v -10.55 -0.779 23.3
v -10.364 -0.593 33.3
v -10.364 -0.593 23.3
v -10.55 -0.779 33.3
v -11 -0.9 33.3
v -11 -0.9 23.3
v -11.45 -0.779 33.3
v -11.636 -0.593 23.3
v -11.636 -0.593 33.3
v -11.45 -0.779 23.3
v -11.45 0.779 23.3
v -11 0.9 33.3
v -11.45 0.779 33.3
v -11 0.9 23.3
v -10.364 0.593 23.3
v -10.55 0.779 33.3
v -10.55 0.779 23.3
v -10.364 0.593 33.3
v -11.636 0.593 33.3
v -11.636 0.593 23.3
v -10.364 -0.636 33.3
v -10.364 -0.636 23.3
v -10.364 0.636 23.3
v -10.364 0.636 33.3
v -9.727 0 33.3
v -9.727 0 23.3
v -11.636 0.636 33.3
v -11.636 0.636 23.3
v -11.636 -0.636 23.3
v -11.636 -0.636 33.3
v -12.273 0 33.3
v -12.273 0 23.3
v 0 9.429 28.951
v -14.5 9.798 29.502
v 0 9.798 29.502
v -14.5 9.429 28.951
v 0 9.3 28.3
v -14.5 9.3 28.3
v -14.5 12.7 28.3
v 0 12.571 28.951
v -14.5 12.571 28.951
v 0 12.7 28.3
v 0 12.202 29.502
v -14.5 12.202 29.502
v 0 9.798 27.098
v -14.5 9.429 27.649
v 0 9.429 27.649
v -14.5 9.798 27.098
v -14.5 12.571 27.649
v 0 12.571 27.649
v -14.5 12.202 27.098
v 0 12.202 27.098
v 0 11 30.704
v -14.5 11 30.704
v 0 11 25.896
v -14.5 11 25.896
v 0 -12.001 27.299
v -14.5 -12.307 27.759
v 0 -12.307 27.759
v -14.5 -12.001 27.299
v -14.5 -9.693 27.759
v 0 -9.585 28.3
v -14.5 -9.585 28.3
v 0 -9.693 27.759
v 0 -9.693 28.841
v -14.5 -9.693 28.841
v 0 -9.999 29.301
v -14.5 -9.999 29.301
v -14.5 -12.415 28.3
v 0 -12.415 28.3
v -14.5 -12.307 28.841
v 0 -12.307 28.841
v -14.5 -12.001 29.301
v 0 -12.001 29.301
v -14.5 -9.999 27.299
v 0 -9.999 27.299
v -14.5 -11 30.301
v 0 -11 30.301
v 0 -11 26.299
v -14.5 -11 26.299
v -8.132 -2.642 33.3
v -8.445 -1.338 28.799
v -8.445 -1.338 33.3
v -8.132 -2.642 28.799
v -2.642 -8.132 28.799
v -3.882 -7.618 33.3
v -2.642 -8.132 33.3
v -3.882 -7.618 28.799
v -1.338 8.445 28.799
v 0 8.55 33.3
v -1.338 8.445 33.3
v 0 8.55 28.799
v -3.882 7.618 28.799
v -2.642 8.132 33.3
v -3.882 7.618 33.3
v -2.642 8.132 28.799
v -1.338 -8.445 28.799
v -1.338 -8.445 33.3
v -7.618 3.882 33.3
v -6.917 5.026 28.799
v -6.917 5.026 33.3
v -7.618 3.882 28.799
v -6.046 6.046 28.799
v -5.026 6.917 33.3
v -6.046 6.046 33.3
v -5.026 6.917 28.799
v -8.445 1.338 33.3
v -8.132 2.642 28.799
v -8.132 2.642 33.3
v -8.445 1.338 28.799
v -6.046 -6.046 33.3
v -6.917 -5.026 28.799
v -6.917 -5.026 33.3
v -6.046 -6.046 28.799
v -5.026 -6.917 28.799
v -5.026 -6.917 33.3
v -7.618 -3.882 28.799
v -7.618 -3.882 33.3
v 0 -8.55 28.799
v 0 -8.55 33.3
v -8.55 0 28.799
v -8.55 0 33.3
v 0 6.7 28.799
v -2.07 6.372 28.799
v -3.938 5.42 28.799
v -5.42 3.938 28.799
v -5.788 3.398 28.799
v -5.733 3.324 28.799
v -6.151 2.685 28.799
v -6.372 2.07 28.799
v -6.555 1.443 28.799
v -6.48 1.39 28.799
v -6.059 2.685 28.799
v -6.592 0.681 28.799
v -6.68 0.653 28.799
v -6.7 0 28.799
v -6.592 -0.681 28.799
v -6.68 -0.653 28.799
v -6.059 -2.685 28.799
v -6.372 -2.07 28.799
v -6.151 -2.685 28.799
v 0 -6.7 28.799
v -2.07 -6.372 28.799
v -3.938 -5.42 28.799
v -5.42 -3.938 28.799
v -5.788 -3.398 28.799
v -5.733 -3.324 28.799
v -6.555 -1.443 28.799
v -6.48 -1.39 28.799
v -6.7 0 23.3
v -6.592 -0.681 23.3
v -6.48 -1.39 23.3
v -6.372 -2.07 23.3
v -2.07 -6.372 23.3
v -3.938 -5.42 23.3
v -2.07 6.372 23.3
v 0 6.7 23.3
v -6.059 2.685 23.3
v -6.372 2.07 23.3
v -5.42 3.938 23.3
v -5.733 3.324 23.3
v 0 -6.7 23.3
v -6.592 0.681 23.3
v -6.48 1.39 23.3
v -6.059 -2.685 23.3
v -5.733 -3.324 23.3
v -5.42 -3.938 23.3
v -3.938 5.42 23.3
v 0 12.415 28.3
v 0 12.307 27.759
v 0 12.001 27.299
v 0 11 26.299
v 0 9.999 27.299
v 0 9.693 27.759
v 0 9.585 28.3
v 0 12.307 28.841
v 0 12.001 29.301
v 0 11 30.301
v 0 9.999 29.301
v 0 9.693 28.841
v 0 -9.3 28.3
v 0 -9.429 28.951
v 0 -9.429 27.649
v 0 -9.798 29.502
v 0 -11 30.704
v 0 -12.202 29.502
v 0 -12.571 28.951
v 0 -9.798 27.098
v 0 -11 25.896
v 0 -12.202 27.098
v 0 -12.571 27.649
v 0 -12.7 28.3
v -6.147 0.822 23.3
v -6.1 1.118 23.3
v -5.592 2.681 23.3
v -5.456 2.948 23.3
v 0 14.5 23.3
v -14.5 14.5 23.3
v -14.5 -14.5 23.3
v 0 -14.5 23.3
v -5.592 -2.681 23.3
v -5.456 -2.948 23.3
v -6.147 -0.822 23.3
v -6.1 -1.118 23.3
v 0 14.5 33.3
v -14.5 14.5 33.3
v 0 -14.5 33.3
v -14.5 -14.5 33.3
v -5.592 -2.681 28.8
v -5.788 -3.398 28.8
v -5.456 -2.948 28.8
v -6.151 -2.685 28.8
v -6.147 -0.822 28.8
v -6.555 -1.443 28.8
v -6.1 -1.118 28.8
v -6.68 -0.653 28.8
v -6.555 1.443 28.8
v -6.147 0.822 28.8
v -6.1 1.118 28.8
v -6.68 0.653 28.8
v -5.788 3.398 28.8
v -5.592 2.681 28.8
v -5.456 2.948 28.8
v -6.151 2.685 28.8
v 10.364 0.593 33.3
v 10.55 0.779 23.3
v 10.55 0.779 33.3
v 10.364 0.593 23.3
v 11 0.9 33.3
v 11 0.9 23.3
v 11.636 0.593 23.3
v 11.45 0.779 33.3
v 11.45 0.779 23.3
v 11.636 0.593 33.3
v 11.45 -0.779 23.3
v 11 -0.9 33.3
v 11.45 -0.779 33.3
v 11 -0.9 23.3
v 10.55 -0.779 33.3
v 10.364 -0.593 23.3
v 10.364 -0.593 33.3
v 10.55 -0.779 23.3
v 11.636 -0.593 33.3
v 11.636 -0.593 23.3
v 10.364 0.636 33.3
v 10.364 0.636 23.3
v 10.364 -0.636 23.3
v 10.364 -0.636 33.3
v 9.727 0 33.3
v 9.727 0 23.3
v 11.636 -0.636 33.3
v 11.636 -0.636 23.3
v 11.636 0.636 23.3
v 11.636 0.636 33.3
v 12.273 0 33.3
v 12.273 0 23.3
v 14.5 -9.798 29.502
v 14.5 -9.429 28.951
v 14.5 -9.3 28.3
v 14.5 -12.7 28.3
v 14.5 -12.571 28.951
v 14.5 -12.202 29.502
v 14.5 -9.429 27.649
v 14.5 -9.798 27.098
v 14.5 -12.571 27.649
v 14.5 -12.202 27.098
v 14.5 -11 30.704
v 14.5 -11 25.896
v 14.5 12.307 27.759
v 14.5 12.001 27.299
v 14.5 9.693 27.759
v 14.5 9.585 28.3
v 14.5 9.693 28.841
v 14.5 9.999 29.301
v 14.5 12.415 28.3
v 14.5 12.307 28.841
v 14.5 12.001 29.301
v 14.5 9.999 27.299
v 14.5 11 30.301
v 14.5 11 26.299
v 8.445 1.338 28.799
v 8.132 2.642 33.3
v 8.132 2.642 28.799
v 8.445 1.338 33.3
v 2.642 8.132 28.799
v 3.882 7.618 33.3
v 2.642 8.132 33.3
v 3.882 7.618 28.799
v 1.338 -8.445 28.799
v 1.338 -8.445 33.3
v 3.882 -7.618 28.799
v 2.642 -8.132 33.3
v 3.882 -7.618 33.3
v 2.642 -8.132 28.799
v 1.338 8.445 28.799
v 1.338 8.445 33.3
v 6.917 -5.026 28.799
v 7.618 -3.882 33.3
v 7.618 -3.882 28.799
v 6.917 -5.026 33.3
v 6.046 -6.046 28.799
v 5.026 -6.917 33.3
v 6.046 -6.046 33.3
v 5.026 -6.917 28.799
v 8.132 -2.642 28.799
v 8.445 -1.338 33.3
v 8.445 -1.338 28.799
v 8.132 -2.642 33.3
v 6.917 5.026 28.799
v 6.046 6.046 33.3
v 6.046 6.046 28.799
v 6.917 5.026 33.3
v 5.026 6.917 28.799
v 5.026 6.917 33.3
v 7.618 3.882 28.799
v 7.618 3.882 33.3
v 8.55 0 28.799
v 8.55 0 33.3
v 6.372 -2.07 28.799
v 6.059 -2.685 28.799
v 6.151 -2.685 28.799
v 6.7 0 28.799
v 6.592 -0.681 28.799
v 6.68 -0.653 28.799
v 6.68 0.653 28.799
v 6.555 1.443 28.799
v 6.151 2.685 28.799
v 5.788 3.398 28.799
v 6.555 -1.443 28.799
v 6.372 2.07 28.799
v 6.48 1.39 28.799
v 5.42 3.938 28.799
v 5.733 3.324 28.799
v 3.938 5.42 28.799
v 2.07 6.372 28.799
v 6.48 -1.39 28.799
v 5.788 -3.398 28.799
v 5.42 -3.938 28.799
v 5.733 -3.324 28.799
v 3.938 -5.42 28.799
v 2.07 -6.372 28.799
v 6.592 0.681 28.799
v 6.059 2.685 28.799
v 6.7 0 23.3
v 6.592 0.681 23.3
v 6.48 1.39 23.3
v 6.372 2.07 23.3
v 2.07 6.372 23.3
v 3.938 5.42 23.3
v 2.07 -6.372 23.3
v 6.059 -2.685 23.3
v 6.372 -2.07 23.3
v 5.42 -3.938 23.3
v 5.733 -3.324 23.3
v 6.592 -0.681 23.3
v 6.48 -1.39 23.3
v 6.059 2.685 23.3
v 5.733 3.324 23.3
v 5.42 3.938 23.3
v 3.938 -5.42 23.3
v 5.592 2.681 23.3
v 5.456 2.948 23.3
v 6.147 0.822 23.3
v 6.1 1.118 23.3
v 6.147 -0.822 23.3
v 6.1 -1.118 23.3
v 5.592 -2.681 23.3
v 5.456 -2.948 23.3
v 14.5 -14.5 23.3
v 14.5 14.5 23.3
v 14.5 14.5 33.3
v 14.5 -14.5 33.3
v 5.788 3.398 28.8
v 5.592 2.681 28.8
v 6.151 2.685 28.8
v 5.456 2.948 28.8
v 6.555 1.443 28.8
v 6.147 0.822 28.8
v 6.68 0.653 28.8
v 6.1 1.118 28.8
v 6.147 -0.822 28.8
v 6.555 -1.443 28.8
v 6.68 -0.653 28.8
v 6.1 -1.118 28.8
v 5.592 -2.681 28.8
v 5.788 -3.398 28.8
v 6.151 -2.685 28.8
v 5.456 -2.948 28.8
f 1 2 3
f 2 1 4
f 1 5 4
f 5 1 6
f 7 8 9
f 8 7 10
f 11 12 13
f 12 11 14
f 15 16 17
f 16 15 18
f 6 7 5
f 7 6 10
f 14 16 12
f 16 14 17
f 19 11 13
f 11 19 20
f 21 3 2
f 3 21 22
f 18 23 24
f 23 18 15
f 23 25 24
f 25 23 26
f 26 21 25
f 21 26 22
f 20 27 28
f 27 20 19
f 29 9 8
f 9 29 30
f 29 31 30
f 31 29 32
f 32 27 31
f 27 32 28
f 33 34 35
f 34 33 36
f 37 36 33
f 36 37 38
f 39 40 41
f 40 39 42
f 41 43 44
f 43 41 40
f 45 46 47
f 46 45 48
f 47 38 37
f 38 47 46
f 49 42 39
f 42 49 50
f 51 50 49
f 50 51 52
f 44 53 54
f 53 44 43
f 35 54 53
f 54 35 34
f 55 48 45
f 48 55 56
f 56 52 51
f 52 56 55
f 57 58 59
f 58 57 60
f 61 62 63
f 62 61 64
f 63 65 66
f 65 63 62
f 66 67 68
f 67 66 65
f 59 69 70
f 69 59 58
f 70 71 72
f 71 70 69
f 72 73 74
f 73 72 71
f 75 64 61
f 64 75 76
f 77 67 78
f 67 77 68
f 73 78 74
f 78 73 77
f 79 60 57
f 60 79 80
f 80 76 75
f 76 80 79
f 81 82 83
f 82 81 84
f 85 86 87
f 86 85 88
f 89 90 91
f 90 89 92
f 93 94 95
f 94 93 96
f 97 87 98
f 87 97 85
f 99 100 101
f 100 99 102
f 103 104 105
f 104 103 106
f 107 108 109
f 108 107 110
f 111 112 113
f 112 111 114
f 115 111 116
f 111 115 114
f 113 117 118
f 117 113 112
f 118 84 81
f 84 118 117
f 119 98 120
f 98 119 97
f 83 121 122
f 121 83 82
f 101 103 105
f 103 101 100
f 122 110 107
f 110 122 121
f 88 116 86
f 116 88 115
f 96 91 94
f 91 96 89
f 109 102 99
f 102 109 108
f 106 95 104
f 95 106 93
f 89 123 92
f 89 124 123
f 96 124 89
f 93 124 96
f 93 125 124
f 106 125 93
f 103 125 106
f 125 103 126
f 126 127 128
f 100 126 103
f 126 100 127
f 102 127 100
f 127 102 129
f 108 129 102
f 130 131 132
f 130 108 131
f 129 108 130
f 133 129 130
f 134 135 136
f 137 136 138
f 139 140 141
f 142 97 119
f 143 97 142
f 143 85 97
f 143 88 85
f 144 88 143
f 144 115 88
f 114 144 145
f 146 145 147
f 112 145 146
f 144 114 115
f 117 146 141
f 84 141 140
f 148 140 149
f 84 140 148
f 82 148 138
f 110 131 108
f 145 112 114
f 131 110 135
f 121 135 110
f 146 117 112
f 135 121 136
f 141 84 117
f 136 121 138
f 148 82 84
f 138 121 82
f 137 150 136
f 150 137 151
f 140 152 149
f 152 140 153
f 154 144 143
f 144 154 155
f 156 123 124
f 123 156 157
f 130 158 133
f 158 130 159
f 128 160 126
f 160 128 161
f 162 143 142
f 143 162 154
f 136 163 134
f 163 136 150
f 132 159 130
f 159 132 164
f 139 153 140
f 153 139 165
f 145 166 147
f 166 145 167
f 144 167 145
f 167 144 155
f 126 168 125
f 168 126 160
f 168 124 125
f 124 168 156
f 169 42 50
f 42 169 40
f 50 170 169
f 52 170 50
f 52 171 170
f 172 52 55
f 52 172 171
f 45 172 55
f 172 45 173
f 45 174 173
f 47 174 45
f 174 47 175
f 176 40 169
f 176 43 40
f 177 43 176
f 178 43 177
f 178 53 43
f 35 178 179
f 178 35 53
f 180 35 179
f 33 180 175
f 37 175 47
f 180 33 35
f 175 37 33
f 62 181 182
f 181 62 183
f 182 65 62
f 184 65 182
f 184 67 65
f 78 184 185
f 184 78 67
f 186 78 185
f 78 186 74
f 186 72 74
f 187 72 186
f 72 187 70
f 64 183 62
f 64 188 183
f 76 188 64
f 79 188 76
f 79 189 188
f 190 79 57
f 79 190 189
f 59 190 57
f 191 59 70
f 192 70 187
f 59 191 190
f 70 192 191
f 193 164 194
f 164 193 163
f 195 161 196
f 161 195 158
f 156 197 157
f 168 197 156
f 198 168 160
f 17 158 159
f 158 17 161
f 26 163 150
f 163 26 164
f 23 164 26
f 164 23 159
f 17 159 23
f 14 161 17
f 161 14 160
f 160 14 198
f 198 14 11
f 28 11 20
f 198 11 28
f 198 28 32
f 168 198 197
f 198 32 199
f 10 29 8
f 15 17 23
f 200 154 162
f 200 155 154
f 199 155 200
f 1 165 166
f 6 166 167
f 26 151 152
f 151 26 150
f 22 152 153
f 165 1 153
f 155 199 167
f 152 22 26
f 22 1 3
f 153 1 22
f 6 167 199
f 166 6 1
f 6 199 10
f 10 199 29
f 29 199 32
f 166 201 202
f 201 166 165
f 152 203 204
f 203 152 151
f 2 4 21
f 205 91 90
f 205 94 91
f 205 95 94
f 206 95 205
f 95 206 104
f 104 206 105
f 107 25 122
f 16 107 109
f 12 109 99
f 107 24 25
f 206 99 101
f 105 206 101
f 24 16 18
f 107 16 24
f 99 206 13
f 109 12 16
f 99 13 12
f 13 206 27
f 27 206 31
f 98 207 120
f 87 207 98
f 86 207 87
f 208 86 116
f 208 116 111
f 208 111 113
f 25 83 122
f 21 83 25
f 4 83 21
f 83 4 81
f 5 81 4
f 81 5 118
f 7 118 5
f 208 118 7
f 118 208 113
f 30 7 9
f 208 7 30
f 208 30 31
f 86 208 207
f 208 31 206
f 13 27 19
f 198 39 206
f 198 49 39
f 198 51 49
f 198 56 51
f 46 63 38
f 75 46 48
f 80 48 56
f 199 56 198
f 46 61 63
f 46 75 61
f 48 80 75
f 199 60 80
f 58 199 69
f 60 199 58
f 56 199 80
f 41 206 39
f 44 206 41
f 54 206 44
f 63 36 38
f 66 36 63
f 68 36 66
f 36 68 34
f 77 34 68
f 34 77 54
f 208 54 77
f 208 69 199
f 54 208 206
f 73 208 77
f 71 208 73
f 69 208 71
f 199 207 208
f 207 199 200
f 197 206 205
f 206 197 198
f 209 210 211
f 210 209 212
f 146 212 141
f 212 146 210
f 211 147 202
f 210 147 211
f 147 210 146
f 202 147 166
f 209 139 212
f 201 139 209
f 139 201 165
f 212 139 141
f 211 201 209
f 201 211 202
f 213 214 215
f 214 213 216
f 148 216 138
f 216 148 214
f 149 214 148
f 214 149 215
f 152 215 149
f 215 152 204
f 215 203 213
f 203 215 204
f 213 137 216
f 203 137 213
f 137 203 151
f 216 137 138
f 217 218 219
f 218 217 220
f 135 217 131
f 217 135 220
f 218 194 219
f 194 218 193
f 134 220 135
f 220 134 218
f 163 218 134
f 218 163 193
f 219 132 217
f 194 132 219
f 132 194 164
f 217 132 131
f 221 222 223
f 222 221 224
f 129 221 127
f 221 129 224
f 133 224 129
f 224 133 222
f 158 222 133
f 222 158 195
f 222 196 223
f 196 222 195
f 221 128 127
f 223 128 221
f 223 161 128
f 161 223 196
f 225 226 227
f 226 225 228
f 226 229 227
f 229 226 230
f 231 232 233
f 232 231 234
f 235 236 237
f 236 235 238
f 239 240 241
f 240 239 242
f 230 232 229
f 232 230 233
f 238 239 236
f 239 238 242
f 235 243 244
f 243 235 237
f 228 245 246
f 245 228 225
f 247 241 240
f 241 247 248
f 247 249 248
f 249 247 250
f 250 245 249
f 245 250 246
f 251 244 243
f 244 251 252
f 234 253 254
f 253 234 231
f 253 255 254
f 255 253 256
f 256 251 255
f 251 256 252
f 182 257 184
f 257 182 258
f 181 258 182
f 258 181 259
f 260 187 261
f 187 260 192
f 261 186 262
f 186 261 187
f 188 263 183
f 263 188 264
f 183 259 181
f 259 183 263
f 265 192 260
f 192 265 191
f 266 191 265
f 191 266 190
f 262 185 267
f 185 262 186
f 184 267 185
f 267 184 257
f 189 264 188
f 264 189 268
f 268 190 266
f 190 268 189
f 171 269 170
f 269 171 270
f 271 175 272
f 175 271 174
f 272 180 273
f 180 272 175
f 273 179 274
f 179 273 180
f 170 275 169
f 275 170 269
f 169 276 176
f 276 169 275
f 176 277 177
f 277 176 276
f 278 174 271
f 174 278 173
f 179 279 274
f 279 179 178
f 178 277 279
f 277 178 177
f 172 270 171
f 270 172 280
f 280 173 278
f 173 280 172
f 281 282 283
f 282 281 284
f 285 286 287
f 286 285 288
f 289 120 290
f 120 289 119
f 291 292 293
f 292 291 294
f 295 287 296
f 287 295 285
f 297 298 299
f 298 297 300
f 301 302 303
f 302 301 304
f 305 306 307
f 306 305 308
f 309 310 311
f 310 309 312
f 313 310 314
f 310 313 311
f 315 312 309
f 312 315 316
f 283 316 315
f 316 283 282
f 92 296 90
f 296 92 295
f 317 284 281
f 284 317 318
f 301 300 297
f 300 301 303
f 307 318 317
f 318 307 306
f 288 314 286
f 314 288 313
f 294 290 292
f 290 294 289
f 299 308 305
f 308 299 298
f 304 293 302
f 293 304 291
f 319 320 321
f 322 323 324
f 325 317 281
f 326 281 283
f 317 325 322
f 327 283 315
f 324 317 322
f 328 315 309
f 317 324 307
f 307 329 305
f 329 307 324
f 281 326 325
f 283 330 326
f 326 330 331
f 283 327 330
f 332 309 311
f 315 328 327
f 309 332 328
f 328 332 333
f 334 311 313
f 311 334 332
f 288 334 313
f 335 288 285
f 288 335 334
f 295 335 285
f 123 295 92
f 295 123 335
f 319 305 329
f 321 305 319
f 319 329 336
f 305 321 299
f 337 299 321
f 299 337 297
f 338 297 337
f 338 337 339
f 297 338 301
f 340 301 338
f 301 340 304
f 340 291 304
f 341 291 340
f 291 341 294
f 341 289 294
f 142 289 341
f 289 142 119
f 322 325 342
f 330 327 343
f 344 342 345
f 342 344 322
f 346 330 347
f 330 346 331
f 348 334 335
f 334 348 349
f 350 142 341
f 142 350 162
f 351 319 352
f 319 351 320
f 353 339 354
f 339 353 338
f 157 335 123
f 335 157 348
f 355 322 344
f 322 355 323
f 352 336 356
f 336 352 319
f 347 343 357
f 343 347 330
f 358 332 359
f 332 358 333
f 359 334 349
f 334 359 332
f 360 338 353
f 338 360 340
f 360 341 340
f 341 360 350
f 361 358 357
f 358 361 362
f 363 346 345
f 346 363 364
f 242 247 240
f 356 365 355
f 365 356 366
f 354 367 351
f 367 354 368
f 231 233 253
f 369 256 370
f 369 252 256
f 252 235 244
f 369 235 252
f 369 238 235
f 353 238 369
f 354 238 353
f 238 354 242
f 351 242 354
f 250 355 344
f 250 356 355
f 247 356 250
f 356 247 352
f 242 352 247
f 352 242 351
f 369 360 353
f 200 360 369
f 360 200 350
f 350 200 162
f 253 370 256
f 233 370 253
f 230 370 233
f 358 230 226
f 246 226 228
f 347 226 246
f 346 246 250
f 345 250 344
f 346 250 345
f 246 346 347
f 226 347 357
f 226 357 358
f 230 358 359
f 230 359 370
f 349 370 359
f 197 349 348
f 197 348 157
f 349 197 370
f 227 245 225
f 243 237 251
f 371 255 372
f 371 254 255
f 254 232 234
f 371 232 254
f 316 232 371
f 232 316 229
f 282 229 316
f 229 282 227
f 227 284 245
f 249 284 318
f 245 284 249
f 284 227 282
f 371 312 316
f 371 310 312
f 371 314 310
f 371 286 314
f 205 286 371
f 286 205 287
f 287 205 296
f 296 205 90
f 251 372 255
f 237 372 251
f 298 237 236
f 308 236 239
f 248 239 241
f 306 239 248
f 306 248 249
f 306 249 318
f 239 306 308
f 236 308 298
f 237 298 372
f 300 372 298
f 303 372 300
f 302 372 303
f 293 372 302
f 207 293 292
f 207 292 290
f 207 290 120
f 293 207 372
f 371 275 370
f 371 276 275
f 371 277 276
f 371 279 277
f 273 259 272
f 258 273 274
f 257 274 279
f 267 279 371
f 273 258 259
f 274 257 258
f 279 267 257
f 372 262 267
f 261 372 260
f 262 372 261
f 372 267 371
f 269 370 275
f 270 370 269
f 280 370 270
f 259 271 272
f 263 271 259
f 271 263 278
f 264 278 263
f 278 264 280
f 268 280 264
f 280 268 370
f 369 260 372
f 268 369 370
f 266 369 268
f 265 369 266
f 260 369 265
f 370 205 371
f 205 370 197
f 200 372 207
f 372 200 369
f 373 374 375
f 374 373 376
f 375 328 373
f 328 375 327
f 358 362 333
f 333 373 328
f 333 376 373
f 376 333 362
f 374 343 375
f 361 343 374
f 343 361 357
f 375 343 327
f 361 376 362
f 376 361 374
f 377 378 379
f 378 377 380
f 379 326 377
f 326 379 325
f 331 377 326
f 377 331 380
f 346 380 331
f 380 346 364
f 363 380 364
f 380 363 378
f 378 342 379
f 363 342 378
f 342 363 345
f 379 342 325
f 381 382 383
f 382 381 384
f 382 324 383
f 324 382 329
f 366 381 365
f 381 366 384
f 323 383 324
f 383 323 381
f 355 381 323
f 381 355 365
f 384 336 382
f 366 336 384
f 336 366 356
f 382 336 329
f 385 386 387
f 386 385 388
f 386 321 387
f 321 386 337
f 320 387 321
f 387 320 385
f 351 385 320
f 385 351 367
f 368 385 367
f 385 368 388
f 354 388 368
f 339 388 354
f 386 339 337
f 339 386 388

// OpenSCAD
// file: sprocket_adapter.scad
/* all measures in mm */

/* todo:
** [x] dent holes must be aligned, not dents
** [x] narrower and smaller big dents
** [x] intercusp strain release smaller, 0.1mm
** [x] remove intercuspidation
** [x] M3 thread: -0.15
** [x] M4 thread: -0.20, waterdrop
** [x] 30 mm mount holes M4
** [x] thread for M4
** [x] cut-snap 2 piece
** [x] subtract cube, leave only lower cut-snap
** [x] 2 screws M3 to tighten cut-snap
** [x] thread for M3
** [x] remove some dents - cannot assemble!!
*/

/* Z-extrusion height (vertical) enough to hold M3 screw hole */
zdim = 10;
/* X-length */
xdim = 29;
/* Y-width */
ydim = 29;

/* free space between parts */
freespace = 0.4;

/* number of small dents */
ndent1 = 40;
/* dent depth */
ddent1 = 0.0; // 0.5 default, 0 to disable
/* dent width large */
wdent1l = 0.8;
/* dent width small */
wdent1s = 0.3; 
/* big wheel radius (with dents d = 16.7mm)  */
rbig = (16.7+freespace)/2;
/* big wheel height */
zbig = 4.5;

/* number of big dents = half of small dents */
ndent2 = ndent1/2;
/* dent depth */
ddent2 = 0.5;
/* dent width large */
wdent2l = 0.8;
/* dent width small */
wdent2s = 0.3;
/* small wheel radius (with dents d = 13.0mm) */
rsmall = (13.0+freespace)/2;

/* make sure we cut it all */
overcut = 0.001;

/* mounting hole radius */
rmounthole = 1.8/2;
/* mounting holes distance */
dmounthole = 22;

/* tightening screws distance (B careful, do not intersect dents) */
dtighthole = 22;
/* let M3 screw pass freely */
rM3free = (3+0.4)/2;
/* M3 screw threadhole */
rM3thread = (3-0.17)/2;

/* intercuspidation Y center aligns with tightening hole */
ycuspcenter = dtighthole/2;
/* intercuspidation depth */
dcusp = 4;
/* intercuspidation small, big */
icusps = 4;
icuspb = 5;
freecusp = 0.1;

module droplet_profile(h, r, rotation) {
        union()
        {
          cylinder(h = h, r = r, $fa=360/16, $fs=0.5, center=true);
            rotate([0,0,rotation])
              linear_extrude(height = h, twist = 0, convexity = 2, center=true)
                polygon([
                 [ -r * sqrt(2)/2, r * sqrt(2)/2],
                 [              0, r * sqrt(2)],
                 [  r * sqrt(2)/2, r * sqrt(2)/2],
                 ]);
        }

}

module eye_profile(h, r, rotation) {
        union()
        {
          cylinder(h = h, r = r, $fa=360/16, $fs=0.5, center=true);
          rotate([0,0,rotation])
              linear_extrude(height = h, twist = 0, convexity = 2, center=true)
                polygon([
                 [ -r * sqrt(2)/2, r * sqrt(2)/2],
                 [              0, r * sqrt(2)],
                 [  r * sqrt(2)/2, r * sqrt(2)/2],
                 ]);
          rotate([0,0,180+rotation])
              linear_extrude(height = h, twist = 0, convexity = 2, center=true)
                polygon([
                 [ -r * sqrt(2)/2, r * sqrt(2)/2],
                 [              0, r * sqrt(2)],
                 [  r * sqrt(2)/2, r * sqrt(2)/2],
                 ]);
        }
}

module sprocket_adapter() {
delta=0.001;
union() {
  difference() {
    translate([0,0,zdim/2])
      cube([xdim, ydim, zdim], center=true);
    union() {
      translate([0,0,zbig/2])
          cylinder(h=zbig+delta, r=rbig, $fa=360/ndent1, $fs=0.5, center=true);
      translate([0,0,zdim/2])
          cylinder(h=zdim+delta, r=rsmall, $fa=360/ndent2, $fs=0.5, center=true);

      /* 2 holes for screws cca 30 mm apart */
      translate([-dmounthole/2,0,zdim/2])
        eye_profile(h = zdim + overcut, r = rmounthole, rotation = -90);
      translate([ dmounthole/2,0,zdim/2])
        eye_profile(h = zdim + overcut, r = rmounthole, rotation = 90);

      /* tightening M3 screw, with droplet shape, larger in "removed" part */
      translate([0, -dtighthole/2,zdim/2])
        rotate([0,90,0])
          eye_profile(h = xdim+overcut, r = rM3free, rotation = -90);

      /* tightening M3 screw, with droplet shape, smaller/thread in "extended" part */
      translate([0, dtighthole/2,zdim/2])
        rotate([0,90,0])
          eye_profile(h = xdim+overcut, r = rM3thread, rotation = -90);

      /* polygon cuts this in snap-on half */
      translate([0,0,-delta/2])
      linear_extrude(height = zdim+delta, twist = 0, convexity = 8)
        polygon([[ 0,               -ydim/2],
                 [ xdim,            -ydim/2],
                 [ xdim,             ydim/2],
                 [ 0,                ydim/2],
                 [ 0,                ycuspcenter+icusps/2],

/* intercuspidation removed */
/*
                 [ dcusp,            ycuspcenter+icuspb/2],
                 [ dcusp,            ycuspcenter-icuspb/2],
                 [ 0,                ycuspcenter-icusps/2],
                 [ 0,               -ycuspcenter+icusps/2+freecusp],
                 [-dcusp-freecusp,  -ycuspcenter+icuspb/2+freecusp],
                 [-dcusp-freecusp,  -ycuspcenter-icuspb/2-freecusp],
                 [ 0,               -ycuspcenter-icusps/2-freecusp]
*/
                 ]*(1+delta));

      /* cuts off upper notch for easier insertion */
      translate([dcusp/2,0,zbig/2])
        cube([dcusp,ydim,zbig], center = true);
    }
  }

      /* big radius, small dents */
      for(angle = [360/ndent1/2 : 360/ndent1 : 360])
        if(angle > 180-50 && angle < 180+50)
        rotate([0,0,angle])
          translate([rbig-ddent1/2,0,0])
          {
            linear_extrude(height = zbig, twist = 0, convexity = 2)
              polygon([[ ddent1/2,        -wdent1l/2],
                       [-ddent1/2,        -wdent1s/2],
                       [-ddent1/2,         wdent1s/2],
                       [ ddent1/2,         wdent1l/2]]);
          }

      /* small radius, big dents */
      for(angle = [360/ndent2/2 : 360/ndent2 : 360])
        if(angle > 180-30 && angle < 180+30)
        rotate([0,0,angle])
          translate([rsmall-ddent2/2,0,zbig])
          {
            linear_extrude(height = zdim-zbig, twist = 0, convexity = 2)
              polygon([[ ddent2/2,        -wdent2l/2],
                       [-ddent2/2,        -wdent2s/2],
                       [-ddent2/2,         wdent2s/2],
                       [ ddent2/2,         wdent2l/2]]);
          }
}

}

// printable position
if(0)
translate([0,0,xdim/2])
  rotate([0,-90,0])
    sprocket_adapter();
// file: motor.scad
module motor()
{
  dscrw=31;
  dwide=39;
  lhigh=32.5;
  laxis=16.7;
  daxis=5;
  dround=8;
  dcircle=22;
  hcircle=1.8;
  hsprocket=4.3; // from motor screw front to d1 sprocket
  d1sprocket=13;
  l1sprocket=8.0;
  d2sprocket=16.8;
  l2sprocket=4;

  difference()
  {
  minkowski()
  {
    cube([dwide-dround,dwide-dround,lhigh/2],center=true);
    cylinder(d=dround,h=lhigh/2,center=true,$fn=32);
  }
    for(i=[0:3])
      rotate([0,0,i*90])
        translate([dscrw/2,dscrw/2,lhigh/2-4.9])
          cylinder(d=3,h=lhigh,$fn=16);
  }
  // circle with axis bearing
  translate([0,0,lhigh/2])
    cylinder(d=dcircle,h=hcircle,$fn=64);
  // the axis
  translate([0,0,lhigh/2])
    cylinder(d=daxis,h=laxis,$fn=64);
  // smaller diameter sprocket
  translate([0,0,lhigh/2+hsprocket])
    cylinder(d=d1sprocket,h=l1sprocket,$fn=20);
  // larger diameter sprocket
  translate([0,0,lhigh/2+hsprocket+l1sprocket])
    cylinder(d=d2sprocket,h=l2sprocket,$fn=40);
}

//motor();
// main file
include <motor.scad>
include <sprocket_adapter.scad>

%motor();
translate([0,0,33.3])
rotate([180,0,0])
for(i=[0:1])
  rotate([0,0,180*i])
    sprocket_adapter();
